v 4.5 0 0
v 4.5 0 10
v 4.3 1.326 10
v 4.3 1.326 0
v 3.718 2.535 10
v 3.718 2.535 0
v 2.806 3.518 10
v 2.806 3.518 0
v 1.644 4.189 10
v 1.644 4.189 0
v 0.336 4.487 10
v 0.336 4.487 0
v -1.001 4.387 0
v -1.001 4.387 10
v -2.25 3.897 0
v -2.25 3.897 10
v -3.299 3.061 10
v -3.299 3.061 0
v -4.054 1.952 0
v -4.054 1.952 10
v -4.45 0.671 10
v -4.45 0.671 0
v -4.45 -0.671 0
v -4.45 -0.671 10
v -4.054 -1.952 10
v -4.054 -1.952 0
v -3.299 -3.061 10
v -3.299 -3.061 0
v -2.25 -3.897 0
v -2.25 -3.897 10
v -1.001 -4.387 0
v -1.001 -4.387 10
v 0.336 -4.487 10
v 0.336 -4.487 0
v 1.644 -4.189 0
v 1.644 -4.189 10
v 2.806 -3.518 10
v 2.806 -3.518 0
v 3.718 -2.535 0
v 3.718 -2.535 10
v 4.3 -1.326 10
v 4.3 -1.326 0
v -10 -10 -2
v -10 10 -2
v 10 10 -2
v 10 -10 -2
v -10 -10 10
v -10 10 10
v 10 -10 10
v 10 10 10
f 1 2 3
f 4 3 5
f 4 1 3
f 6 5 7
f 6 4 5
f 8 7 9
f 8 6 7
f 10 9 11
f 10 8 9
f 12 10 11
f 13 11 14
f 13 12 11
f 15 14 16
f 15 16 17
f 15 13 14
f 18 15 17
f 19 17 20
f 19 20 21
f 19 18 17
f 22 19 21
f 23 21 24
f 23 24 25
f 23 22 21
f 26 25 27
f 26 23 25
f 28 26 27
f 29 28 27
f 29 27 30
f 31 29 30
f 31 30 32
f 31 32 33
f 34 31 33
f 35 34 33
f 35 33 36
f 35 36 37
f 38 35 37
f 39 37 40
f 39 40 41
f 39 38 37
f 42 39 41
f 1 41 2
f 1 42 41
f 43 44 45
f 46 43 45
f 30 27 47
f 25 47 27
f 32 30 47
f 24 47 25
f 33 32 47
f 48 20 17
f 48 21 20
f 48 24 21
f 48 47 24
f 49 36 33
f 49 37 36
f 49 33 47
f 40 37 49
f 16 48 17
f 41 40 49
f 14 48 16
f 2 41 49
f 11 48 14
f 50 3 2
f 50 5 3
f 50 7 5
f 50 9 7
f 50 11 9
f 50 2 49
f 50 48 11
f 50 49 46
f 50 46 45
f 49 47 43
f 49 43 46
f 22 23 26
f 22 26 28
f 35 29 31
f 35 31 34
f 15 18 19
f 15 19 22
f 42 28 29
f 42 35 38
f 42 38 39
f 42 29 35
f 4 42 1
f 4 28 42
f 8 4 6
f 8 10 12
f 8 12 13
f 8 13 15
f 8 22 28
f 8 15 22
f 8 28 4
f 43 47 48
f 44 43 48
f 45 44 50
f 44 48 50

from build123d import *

# Parameters (mm, degrees)
SKETCH1_W           = 20
SKETCH1_H           = 20
SKETCH1_R           = 4.5
BOSS_EXTRUDE1_DEPTH = 10
SKETCH2_W           = 20
SKETCH2_H           = 20
BOSS_EXTRUDE2_DEPTH = 2


with BuildPart() as part:
    # Sketch1 → Boss-Extrude1 (new body)
    with BuildSketch(Plane.XY):
        Rectangle(SKETCH1_W, SKETCH1_H)
        Circle(SKETCH1_R, mode=Mode.SUBTRACT)
    extrude(amount=BOSS_EXTRUDE1_DEPTH)

    # Sketch2 → Boss-Extrude2 (add)
    with BuildSketch(Plane.XY):
        Rectangle(SKETCH2_W, SKETCH2_H)
    extrude(amount=-BOSS_EXTRUDE2_DEPTH)


solid = part.part
